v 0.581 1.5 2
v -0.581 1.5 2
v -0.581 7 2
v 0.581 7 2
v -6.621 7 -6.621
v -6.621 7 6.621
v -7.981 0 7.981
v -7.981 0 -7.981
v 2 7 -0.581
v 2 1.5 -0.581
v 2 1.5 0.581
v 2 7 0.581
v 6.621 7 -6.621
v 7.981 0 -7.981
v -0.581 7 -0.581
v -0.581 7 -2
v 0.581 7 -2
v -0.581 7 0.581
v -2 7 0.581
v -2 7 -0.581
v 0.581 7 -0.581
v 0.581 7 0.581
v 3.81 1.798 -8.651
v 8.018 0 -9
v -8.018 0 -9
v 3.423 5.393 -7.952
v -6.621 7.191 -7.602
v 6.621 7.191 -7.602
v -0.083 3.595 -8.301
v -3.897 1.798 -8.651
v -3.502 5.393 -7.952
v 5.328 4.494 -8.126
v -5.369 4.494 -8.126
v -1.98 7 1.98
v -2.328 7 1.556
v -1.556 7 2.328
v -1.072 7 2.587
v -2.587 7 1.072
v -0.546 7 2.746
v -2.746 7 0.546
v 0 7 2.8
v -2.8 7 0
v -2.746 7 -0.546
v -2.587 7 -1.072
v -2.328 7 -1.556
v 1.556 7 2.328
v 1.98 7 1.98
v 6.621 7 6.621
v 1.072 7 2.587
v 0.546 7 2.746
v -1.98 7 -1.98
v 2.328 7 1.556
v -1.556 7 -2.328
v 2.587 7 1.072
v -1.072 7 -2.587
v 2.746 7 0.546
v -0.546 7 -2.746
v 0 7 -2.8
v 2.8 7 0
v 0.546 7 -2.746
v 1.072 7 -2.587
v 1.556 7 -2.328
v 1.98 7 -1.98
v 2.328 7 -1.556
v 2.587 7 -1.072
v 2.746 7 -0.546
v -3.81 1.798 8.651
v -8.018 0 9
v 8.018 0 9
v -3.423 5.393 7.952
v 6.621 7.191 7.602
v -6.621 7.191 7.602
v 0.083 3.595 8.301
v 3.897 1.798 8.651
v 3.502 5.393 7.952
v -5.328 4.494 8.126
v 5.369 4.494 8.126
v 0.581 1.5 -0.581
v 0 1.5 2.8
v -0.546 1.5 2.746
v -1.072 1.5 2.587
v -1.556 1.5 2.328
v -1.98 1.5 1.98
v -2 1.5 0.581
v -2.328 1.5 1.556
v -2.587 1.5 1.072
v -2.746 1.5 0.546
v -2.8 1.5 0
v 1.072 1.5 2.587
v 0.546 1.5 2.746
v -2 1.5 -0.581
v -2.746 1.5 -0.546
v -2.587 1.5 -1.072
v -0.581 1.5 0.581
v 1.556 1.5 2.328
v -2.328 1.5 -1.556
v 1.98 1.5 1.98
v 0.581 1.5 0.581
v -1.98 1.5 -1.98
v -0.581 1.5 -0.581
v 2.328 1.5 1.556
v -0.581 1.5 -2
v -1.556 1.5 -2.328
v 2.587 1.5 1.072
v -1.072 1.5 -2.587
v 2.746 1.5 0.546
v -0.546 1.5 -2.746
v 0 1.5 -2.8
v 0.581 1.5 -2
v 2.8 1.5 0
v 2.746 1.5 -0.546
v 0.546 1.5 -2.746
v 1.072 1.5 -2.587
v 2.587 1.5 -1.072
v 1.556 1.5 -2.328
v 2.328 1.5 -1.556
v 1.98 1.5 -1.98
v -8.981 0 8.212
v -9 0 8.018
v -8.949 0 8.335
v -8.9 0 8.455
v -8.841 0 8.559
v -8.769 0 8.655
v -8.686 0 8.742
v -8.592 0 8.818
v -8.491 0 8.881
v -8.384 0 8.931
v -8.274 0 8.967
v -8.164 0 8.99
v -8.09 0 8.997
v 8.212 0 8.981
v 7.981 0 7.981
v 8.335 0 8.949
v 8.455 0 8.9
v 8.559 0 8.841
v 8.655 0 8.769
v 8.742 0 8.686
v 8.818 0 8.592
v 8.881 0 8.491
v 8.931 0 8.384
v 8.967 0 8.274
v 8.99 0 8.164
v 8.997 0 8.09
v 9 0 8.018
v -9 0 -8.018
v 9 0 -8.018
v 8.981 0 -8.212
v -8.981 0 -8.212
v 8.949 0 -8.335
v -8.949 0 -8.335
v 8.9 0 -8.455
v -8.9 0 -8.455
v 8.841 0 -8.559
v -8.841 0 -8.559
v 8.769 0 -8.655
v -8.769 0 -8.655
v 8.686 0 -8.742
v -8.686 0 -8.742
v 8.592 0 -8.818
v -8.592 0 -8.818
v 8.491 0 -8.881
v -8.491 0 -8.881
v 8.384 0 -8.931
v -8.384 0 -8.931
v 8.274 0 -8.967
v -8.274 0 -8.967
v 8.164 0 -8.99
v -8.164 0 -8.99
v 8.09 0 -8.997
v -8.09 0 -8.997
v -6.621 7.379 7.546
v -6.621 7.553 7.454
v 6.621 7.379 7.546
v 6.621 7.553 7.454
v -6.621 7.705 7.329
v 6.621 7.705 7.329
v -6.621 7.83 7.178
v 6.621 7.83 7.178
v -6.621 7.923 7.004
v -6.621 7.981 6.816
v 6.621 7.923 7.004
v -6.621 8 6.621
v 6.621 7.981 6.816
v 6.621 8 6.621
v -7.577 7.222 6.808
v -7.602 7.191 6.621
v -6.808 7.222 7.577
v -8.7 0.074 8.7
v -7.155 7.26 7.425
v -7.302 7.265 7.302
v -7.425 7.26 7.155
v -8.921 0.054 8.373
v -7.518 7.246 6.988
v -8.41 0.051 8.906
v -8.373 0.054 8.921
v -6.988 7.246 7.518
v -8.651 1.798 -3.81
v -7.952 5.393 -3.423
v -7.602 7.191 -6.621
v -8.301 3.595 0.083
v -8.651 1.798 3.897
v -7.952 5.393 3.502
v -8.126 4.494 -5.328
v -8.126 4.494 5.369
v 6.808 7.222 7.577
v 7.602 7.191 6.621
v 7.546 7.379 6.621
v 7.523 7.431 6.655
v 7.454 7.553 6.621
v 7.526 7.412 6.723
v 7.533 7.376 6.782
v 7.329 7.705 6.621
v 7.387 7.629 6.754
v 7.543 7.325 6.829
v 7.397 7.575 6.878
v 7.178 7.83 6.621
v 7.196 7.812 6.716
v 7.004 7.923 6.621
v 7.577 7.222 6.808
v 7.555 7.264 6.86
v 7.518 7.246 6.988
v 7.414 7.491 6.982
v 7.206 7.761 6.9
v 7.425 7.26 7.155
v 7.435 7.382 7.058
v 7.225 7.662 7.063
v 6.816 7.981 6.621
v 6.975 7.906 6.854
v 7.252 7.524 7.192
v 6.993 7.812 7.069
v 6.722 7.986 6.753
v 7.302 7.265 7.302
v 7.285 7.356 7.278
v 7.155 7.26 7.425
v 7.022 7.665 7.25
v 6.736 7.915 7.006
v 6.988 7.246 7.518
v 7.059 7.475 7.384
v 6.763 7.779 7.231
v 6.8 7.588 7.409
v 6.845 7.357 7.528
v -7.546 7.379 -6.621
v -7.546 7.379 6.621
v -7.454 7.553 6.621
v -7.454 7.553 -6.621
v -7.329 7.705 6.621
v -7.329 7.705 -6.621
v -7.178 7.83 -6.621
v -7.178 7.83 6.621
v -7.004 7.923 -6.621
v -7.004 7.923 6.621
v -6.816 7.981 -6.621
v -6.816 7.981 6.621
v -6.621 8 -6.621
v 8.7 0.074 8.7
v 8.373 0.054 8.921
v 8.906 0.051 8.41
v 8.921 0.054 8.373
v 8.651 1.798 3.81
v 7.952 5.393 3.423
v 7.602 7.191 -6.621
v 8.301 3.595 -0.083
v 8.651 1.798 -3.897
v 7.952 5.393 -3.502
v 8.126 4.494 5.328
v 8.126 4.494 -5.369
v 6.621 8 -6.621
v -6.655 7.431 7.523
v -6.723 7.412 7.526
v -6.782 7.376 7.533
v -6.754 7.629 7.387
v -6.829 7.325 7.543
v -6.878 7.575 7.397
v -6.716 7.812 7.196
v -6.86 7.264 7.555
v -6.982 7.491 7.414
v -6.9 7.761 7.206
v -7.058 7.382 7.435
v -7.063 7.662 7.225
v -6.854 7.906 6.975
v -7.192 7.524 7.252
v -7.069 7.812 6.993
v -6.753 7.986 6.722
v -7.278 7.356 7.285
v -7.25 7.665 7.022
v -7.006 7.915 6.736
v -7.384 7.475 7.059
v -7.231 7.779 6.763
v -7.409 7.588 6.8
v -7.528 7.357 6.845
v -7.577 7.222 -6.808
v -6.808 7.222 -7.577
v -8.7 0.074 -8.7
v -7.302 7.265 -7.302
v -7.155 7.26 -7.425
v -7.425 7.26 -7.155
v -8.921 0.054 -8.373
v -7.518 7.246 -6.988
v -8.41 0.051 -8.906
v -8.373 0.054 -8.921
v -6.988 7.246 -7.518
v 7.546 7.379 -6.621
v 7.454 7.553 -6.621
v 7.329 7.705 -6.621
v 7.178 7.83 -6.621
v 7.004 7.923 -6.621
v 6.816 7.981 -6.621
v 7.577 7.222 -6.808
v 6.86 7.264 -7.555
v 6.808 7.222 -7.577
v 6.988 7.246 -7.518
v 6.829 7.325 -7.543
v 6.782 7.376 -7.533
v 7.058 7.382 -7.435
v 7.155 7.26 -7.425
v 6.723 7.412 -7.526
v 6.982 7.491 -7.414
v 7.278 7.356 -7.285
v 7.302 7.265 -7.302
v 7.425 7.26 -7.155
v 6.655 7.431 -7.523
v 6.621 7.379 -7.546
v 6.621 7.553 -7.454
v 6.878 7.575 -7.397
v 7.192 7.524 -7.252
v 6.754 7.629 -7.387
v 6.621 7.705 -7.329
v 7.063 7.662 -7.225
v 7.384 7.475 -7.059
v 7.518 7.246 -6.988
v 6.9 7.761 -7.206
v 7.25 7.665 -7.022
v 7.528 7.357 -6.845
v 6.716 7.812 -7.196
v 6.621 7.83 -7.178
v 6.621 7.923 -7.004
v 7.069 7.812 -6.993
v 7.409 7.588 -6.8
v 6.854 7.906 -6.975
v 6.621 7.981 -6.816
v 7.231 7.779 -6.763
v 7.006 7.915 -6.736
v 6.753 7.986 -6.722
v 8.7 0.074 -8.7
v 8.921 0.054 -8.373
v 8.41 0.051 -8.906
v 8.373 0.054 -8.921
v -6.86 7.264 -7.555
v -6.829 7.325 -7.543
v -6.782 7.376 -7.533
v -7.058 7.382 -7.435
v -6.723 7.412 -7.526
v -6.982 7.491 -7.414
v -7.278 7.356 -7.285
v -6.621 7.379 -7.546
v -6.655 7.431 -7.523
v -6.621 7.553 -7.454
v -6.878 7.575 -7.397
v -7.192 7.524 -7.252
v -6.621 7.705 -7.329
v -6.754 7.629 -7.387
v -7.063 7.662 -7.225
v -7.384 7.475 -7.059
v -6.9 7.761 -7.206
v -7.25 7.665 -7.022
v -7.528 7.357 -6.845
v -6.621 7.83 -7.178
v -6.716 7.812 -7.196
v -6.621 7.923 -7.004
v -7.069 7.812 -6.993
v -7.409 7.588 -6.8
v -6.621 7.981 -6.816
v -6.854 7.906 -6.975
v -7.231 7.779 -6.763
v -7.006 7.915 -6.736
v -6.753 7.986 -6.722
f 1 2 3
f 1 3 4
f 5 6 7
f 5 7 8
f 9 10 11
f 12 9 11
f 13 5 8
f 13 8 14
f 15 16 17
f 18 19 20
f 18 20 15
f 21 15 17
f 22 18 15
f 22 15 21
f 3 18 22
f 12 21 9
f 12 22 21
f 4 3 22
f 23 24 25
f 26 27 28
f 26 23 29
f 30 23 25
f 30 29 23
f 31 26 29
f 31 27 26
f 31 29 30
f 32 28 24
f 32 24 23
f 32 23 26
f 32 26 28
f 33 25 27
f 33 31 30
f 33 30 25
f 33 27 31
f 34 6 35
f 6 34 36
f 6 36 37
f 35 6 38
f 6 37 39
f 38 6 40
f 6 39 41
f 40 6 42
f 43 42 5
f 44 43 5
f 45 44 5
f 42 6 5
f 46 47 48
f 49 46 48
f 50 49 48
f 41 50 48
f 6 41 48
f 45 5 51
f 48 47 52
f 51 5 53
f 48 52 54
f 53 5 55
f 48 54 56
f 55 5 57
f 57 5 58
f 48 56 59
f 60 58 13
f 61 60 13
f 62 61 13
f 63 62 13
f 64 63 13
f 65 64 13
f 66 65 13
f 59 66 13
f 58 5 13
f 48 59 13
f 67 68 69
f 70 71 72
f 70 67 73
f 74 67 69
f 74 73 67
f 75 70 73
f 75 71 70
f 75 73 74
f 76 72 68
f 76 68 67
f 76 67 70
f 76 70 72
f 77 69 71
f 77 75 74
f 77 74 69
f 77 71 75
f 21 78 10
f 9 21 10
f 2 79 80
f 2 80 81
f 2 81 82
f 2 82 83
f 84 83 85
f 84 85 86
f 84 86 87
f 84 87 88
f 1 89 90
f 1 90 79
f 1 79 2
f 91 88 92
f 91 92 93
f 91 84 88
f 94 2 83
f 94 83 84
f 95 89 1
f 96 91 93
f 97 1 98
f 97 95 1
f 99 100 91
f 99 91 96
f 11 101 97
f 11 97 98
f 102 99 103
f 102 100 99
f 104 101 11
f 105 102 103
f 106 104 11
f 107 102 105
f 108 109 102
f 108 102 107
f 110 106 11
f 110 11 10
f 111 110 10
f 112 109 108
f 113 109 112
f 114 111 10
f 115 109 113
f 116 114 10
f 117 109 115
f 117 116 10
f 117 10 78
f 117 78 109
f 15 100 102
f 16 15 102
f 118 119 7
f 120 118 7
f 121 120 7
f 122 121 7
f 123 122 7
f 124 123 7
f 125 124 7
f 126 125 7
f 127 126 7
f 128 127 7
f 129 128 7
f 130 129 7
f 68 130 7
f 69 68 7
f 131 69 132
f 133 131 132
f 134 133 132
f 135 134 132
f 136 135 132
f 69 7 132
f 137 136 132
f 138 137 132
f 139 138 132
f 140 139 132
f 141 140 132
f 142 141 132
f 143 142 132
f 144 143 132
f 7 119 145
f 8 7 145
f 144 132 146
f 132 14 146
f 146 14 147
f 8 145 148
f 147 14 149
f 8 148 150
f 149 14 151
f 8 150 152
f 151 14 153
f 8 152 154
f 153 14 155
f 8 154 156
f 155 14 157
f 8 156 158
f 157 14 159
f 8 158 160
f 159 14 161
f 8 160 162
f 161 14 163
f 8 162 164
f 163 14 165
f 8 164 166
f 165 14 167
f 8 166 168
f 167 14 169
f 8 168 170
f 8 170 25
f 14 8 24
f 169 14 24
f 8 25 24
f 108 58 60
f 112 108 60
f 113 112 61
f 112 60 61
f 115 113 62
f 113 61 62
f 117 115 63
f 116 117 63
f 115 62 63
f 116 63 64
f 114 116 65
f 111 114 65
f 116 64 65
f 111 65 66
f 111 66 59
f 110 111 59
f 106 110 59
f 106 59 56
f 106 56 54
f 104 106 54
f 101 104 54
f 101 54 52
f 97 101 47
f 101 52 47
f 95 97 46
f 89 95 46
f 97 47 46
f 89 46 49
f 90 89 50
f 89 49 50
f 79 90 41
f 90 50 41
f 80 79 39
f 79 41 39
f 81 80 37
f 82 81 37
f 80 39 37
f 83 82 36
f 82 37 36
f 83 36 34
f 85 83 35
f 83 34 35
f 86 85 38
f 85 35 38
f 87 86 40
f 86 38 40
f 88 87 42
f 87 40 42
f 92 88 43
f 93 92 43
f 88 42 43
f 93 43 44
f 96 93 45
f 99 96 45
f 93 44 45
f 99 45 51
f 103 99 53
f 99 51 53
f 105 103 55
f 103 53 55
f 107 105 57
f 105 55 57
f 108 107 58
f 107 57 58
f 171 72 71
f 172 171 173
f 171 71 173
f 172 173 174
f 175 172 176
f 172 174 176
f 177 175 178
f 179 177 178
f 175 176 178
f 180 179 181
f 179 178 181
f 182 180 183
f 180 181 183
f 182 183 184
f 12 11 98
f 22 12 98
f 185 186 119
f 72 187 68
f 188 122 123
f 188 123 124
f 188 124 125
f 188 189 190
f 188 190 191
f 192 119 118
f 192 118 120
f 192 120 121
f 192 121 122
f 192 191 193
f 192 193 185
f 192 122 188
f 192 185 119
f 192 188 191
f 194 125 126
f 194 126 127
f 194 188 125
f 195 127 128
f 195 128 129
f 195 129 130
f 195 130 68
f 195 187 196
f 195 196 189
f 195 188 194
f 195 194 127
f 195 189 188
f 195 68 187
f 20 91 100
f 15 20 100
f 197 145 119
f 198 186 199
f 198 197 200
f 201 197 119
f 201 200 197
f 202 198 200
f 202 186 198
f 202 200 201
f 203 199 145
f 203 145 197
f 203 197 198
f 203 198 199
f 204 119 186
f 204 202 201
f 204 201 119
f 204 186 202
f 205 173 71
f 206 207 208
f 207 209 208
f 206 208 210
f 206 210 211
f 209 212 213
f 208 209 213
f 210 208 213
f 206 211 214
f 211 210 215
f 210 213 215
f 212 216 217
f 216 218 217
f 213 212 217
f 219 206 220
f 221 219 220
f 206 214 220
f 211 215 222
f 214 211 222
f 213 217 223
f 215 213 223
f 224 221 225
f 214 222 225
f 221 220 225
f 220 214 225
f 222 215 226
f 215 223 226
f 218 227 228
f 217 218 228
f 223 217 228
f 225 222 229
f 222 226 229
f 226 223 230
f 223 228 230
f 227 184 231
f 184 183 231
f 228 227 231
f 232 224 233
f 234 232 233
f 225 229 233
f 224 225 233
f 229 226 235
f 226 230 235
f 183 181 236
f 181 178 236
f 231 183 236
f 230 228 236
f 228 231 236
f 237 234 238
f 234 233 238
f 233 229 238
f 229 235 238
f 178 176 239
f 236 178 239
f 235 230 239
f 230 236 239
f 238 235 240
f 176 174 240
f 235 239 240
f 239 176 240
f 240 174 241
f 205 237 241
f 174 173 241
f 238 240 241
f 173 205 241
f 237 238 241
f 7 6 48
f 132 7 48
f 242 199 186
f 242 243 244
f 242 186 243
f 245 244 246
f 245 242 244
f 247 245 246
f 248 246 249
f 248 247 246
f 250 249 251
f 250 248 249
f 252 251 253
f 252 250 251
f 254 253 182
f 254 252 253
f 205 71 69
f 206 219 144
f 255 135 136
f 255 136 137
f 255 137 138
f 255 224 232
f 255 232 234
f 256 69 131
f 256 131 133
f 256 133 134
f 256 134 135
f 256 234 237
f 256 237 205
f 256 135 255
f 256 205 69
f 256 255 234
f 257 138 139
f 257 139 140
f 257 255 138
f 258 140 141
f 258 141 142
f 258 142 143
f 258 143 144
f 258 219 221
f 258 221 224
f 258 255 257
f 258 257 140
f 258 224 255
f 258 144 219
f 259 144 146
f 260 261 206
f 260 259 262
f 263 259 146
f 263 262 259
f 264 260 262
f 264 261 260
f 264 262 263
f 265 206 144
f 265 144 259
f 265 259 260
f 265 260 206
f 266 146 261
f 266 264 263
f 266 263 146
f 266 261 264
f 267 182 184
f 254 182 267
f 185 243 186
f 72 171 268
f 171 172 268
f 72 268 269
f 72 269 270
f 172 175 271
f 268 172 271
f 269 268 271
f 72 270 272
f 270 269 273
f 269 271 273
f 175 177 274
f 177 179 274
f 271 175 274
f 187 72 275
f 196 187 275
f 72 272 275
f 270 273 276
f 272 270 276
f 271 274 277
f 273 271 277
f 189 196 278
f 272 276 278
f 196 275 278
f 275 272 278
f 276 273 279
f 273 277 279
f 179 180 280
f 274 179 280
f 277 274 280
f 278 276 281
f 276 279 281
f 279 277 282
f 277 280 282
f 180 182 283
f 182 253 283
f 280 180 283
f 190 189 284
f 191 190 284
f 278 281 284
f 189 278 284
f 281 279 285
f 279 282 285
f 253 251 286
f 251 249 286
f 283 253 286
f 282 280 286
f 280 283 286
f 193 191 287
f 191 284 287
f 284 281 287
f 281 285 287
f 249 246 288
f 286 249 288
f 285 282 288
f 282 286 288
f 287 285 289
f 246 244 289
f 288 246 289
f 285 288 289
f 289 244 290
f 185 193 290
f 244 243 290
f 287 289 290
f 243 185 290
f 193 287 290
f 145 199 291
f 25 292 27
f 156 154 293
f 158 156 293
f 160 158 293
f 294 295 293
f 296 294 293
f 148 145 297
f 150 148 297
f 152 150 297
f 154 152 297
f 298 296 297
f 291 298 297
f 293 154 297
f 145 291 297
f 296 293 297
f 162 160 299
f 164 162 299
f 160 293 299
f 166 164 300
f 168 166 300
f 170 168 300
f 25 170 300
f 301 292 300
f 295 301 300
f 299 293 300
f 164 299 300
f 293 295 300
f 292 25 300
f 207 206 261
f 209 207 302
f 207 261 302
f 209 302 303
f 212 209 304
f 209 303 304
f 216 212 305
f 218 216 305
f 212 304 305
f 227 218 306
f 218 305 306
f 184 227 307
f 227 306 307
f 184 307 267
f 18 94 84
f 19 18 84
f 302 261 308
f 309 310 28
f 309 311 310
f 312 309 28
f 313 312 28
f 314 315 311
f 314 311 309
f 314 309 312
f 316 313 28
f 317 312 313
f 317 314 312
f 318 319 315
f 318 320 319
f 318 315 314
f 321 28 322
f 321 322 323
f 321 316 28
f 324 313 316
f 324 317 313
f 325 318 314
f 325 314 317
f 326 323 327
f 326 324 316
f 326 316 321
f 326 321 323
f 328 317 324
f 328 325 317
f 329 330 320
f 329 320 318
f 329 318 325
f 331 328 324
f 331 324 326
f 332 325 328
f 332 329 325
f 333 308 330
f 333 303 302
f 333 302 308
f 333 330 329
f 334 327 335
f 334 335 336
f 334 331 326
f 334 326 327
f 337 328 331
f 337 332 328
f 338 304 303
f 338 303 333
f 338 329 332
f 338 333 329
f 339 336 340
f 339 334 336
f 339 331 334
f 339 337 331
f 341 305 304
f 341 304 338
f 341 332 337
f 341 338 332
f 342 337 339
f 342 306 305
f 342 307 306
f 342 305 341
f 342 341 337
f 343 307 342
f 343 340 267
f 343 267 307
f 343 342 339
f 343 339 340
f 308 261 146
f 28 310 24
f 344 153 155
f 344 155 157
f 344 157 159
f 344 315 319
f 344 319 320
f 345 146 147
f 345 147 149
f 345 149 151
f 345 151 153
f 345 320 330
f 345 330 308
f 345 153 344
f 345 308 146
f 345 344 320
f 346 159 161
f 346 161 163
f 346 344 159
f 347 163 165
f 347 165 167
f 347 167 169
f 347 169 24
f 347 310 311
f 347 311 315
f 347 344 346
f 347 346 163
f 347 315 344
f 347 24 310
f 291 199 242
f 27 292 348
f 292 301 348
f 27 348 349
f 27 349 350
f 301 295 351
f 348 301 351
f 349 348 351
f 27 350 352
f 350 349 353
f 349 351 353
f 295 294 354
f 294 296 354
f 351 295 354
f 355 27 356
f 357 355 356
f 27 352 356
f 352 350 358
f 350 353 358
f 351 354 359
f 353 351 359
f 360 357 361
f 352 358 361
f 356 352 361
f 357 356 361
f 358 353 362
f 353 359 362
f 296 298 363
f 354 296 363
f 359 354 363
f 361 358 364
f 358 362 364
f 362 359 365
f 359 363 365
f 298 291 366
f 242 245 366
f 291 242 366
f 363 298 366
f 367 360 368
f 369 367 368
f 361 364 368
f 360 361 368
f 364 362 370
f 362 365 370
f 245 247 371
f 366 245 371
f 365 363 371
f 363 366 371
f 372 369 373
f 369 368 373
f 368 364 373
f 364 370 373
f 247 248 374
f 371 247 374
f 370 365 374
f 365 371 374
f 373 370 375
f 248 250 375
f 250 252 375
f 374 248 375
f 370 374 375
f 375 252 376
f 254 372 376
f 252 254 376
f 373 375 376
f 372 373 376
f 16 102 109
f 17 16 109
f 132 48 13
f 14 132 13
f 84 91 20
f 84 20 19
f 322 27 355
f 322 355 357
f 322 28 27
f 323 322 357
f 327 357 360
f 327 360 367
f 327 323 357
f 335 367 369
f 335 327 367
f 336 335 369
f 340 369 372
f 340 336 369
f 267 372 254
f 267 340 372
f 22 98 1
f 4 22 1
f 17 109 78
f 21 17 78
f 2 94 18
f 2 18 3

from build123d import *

# Parameters (mm, degrees)
SKETCH2_W           = 18
SKETCH2_H           = 18
BOSS_EXTRUDE1_DEPTH = 8
BOSS_EXTRUDE1_TAPER = 11
FILLET1_R           = 1
SHELL1_OUTLINE_W    = 13.241242282
SHELL1_OUTLINE_H    = 13.241242282
SHELL1_DEPTH        = 7
SHELL1_DRAFT        = 11
SKETCH3_R           = 2.8
BOSS_EXTRUDE2_DEPTH = 5.5
SKETCH4_W           = 1.161559242
SKETCH4_H           = 1.419220379
SKETCH4_H_2         = 1.161559242
SKETCH4_W_2         = 1.419220379
CUT_EXTRUDE1_DEPTH  = 5.5


# Read off the part's stored shape, not the designer's step: Shell1
with BuildPart() as part:
    # Sketch2 → Boss-Extrude1 (new body)
    with BuildSketch(Plane(origin=(0, 0, 0), x_dir=(1, 0, 0), z_dir=(0, 1, 0))):
        Rectangle(SKETCH2_W, SKETCH2_H)
    extrude(amount=BOSS_EXTRUDE1_DEPTH, taper=BOSS_EXTRUDE1_TAPER)

    # Fillet1
    fillet1_edges = [part.edges().sort_by_distance(p)[0] for p in [
        (-7.444957527, 8, 0),
        (0, 8, 7.444957527),
        (7.444957527, 8, 0),
        (8.222478763, 4, 8.222478763),
        (-8.222478763, 4, 8.222478763),
        (-8.222478763, 4, -8.222478763),
        (8.222478763, 4, -8.222478763),
        (0, 8, -7.444957527),
    ]]
    fillet(fillet1_edges, radius=FILLET1_R)


with BuildPart() as shell1_tool:
    # Shell1 outline → Shell1 (with draft: the straight prism first)
    with BuildSketch(Plane(origin=(0, 7, 0), x_dir=(1, 0, 0), z_dir=(0, 1, 0))):
        Rectangle(SHELL1_OUTLINE_W, SHELL1_OUTLINE_H)
    extrude(amount=-SHELL1_DEPTH)
    # Shell1: the draft: its side faces are tilted about the plane it starts from
    shell1_sides = [shell1_tool.faces().sort_by_distance(p)[0] for p in [
        (0, 3.5, -6.620621141),
        (-6.620621141, 3.5, 0),
        (0, 3.5, 6.620621141),
        (6.620621141, 3.5, 0),
    ]]
    draft(shell1_sides, Plane(origin=(0, 7, 0), x_dir=(1, 0, 0), z_dir=(0, 1, 0)), SHELL1_DRAFT)


with BuildPart() as part_1:
    add(part.part)

    # Shell1: cut by shell1_tool
    add(shell1_tool.part, mode=Mode.SUBTRACT)

    # Sketch3 → Boss-Extrude2 (add)
    with BuildSketch(Plane.XZ.offset(-7)):
        with Locations(Location((0, 0, 0), (0, 0, 270))):
            Circle(SKETCH3_R)
    extrude(amount=BOSS_EXTRUDE2_DEPTH)

    # Sketch4 → Cut-Extrude1 (cut)
    with BuildSketch(Plane.XZ.offset(-1.5)):
        with Locations((0, -1.290389811)):
            Rectangle(SKETCH4_W, SKETCH4_H)
        Rectangle(SKETCH4_W, SKETCH4_H_2)
        with Locations((-1.290389811, 0)):
            Rectangle(SKETCH4_W_2, SKETCH4_H_2)
        with Locations((1.290389811, 0)):
            Rectangle(SKETCH4_W_2, SKETCH4_H_2)
        with Locations((0, 1.290389811)):
            Rectangle(SKETCH4_W, SKETCH4_H)
    extrude(amount=-CUT_EXTRUDE1_DEPTH, mode=Mode.SUBTRACT)


solid = part_1.part
